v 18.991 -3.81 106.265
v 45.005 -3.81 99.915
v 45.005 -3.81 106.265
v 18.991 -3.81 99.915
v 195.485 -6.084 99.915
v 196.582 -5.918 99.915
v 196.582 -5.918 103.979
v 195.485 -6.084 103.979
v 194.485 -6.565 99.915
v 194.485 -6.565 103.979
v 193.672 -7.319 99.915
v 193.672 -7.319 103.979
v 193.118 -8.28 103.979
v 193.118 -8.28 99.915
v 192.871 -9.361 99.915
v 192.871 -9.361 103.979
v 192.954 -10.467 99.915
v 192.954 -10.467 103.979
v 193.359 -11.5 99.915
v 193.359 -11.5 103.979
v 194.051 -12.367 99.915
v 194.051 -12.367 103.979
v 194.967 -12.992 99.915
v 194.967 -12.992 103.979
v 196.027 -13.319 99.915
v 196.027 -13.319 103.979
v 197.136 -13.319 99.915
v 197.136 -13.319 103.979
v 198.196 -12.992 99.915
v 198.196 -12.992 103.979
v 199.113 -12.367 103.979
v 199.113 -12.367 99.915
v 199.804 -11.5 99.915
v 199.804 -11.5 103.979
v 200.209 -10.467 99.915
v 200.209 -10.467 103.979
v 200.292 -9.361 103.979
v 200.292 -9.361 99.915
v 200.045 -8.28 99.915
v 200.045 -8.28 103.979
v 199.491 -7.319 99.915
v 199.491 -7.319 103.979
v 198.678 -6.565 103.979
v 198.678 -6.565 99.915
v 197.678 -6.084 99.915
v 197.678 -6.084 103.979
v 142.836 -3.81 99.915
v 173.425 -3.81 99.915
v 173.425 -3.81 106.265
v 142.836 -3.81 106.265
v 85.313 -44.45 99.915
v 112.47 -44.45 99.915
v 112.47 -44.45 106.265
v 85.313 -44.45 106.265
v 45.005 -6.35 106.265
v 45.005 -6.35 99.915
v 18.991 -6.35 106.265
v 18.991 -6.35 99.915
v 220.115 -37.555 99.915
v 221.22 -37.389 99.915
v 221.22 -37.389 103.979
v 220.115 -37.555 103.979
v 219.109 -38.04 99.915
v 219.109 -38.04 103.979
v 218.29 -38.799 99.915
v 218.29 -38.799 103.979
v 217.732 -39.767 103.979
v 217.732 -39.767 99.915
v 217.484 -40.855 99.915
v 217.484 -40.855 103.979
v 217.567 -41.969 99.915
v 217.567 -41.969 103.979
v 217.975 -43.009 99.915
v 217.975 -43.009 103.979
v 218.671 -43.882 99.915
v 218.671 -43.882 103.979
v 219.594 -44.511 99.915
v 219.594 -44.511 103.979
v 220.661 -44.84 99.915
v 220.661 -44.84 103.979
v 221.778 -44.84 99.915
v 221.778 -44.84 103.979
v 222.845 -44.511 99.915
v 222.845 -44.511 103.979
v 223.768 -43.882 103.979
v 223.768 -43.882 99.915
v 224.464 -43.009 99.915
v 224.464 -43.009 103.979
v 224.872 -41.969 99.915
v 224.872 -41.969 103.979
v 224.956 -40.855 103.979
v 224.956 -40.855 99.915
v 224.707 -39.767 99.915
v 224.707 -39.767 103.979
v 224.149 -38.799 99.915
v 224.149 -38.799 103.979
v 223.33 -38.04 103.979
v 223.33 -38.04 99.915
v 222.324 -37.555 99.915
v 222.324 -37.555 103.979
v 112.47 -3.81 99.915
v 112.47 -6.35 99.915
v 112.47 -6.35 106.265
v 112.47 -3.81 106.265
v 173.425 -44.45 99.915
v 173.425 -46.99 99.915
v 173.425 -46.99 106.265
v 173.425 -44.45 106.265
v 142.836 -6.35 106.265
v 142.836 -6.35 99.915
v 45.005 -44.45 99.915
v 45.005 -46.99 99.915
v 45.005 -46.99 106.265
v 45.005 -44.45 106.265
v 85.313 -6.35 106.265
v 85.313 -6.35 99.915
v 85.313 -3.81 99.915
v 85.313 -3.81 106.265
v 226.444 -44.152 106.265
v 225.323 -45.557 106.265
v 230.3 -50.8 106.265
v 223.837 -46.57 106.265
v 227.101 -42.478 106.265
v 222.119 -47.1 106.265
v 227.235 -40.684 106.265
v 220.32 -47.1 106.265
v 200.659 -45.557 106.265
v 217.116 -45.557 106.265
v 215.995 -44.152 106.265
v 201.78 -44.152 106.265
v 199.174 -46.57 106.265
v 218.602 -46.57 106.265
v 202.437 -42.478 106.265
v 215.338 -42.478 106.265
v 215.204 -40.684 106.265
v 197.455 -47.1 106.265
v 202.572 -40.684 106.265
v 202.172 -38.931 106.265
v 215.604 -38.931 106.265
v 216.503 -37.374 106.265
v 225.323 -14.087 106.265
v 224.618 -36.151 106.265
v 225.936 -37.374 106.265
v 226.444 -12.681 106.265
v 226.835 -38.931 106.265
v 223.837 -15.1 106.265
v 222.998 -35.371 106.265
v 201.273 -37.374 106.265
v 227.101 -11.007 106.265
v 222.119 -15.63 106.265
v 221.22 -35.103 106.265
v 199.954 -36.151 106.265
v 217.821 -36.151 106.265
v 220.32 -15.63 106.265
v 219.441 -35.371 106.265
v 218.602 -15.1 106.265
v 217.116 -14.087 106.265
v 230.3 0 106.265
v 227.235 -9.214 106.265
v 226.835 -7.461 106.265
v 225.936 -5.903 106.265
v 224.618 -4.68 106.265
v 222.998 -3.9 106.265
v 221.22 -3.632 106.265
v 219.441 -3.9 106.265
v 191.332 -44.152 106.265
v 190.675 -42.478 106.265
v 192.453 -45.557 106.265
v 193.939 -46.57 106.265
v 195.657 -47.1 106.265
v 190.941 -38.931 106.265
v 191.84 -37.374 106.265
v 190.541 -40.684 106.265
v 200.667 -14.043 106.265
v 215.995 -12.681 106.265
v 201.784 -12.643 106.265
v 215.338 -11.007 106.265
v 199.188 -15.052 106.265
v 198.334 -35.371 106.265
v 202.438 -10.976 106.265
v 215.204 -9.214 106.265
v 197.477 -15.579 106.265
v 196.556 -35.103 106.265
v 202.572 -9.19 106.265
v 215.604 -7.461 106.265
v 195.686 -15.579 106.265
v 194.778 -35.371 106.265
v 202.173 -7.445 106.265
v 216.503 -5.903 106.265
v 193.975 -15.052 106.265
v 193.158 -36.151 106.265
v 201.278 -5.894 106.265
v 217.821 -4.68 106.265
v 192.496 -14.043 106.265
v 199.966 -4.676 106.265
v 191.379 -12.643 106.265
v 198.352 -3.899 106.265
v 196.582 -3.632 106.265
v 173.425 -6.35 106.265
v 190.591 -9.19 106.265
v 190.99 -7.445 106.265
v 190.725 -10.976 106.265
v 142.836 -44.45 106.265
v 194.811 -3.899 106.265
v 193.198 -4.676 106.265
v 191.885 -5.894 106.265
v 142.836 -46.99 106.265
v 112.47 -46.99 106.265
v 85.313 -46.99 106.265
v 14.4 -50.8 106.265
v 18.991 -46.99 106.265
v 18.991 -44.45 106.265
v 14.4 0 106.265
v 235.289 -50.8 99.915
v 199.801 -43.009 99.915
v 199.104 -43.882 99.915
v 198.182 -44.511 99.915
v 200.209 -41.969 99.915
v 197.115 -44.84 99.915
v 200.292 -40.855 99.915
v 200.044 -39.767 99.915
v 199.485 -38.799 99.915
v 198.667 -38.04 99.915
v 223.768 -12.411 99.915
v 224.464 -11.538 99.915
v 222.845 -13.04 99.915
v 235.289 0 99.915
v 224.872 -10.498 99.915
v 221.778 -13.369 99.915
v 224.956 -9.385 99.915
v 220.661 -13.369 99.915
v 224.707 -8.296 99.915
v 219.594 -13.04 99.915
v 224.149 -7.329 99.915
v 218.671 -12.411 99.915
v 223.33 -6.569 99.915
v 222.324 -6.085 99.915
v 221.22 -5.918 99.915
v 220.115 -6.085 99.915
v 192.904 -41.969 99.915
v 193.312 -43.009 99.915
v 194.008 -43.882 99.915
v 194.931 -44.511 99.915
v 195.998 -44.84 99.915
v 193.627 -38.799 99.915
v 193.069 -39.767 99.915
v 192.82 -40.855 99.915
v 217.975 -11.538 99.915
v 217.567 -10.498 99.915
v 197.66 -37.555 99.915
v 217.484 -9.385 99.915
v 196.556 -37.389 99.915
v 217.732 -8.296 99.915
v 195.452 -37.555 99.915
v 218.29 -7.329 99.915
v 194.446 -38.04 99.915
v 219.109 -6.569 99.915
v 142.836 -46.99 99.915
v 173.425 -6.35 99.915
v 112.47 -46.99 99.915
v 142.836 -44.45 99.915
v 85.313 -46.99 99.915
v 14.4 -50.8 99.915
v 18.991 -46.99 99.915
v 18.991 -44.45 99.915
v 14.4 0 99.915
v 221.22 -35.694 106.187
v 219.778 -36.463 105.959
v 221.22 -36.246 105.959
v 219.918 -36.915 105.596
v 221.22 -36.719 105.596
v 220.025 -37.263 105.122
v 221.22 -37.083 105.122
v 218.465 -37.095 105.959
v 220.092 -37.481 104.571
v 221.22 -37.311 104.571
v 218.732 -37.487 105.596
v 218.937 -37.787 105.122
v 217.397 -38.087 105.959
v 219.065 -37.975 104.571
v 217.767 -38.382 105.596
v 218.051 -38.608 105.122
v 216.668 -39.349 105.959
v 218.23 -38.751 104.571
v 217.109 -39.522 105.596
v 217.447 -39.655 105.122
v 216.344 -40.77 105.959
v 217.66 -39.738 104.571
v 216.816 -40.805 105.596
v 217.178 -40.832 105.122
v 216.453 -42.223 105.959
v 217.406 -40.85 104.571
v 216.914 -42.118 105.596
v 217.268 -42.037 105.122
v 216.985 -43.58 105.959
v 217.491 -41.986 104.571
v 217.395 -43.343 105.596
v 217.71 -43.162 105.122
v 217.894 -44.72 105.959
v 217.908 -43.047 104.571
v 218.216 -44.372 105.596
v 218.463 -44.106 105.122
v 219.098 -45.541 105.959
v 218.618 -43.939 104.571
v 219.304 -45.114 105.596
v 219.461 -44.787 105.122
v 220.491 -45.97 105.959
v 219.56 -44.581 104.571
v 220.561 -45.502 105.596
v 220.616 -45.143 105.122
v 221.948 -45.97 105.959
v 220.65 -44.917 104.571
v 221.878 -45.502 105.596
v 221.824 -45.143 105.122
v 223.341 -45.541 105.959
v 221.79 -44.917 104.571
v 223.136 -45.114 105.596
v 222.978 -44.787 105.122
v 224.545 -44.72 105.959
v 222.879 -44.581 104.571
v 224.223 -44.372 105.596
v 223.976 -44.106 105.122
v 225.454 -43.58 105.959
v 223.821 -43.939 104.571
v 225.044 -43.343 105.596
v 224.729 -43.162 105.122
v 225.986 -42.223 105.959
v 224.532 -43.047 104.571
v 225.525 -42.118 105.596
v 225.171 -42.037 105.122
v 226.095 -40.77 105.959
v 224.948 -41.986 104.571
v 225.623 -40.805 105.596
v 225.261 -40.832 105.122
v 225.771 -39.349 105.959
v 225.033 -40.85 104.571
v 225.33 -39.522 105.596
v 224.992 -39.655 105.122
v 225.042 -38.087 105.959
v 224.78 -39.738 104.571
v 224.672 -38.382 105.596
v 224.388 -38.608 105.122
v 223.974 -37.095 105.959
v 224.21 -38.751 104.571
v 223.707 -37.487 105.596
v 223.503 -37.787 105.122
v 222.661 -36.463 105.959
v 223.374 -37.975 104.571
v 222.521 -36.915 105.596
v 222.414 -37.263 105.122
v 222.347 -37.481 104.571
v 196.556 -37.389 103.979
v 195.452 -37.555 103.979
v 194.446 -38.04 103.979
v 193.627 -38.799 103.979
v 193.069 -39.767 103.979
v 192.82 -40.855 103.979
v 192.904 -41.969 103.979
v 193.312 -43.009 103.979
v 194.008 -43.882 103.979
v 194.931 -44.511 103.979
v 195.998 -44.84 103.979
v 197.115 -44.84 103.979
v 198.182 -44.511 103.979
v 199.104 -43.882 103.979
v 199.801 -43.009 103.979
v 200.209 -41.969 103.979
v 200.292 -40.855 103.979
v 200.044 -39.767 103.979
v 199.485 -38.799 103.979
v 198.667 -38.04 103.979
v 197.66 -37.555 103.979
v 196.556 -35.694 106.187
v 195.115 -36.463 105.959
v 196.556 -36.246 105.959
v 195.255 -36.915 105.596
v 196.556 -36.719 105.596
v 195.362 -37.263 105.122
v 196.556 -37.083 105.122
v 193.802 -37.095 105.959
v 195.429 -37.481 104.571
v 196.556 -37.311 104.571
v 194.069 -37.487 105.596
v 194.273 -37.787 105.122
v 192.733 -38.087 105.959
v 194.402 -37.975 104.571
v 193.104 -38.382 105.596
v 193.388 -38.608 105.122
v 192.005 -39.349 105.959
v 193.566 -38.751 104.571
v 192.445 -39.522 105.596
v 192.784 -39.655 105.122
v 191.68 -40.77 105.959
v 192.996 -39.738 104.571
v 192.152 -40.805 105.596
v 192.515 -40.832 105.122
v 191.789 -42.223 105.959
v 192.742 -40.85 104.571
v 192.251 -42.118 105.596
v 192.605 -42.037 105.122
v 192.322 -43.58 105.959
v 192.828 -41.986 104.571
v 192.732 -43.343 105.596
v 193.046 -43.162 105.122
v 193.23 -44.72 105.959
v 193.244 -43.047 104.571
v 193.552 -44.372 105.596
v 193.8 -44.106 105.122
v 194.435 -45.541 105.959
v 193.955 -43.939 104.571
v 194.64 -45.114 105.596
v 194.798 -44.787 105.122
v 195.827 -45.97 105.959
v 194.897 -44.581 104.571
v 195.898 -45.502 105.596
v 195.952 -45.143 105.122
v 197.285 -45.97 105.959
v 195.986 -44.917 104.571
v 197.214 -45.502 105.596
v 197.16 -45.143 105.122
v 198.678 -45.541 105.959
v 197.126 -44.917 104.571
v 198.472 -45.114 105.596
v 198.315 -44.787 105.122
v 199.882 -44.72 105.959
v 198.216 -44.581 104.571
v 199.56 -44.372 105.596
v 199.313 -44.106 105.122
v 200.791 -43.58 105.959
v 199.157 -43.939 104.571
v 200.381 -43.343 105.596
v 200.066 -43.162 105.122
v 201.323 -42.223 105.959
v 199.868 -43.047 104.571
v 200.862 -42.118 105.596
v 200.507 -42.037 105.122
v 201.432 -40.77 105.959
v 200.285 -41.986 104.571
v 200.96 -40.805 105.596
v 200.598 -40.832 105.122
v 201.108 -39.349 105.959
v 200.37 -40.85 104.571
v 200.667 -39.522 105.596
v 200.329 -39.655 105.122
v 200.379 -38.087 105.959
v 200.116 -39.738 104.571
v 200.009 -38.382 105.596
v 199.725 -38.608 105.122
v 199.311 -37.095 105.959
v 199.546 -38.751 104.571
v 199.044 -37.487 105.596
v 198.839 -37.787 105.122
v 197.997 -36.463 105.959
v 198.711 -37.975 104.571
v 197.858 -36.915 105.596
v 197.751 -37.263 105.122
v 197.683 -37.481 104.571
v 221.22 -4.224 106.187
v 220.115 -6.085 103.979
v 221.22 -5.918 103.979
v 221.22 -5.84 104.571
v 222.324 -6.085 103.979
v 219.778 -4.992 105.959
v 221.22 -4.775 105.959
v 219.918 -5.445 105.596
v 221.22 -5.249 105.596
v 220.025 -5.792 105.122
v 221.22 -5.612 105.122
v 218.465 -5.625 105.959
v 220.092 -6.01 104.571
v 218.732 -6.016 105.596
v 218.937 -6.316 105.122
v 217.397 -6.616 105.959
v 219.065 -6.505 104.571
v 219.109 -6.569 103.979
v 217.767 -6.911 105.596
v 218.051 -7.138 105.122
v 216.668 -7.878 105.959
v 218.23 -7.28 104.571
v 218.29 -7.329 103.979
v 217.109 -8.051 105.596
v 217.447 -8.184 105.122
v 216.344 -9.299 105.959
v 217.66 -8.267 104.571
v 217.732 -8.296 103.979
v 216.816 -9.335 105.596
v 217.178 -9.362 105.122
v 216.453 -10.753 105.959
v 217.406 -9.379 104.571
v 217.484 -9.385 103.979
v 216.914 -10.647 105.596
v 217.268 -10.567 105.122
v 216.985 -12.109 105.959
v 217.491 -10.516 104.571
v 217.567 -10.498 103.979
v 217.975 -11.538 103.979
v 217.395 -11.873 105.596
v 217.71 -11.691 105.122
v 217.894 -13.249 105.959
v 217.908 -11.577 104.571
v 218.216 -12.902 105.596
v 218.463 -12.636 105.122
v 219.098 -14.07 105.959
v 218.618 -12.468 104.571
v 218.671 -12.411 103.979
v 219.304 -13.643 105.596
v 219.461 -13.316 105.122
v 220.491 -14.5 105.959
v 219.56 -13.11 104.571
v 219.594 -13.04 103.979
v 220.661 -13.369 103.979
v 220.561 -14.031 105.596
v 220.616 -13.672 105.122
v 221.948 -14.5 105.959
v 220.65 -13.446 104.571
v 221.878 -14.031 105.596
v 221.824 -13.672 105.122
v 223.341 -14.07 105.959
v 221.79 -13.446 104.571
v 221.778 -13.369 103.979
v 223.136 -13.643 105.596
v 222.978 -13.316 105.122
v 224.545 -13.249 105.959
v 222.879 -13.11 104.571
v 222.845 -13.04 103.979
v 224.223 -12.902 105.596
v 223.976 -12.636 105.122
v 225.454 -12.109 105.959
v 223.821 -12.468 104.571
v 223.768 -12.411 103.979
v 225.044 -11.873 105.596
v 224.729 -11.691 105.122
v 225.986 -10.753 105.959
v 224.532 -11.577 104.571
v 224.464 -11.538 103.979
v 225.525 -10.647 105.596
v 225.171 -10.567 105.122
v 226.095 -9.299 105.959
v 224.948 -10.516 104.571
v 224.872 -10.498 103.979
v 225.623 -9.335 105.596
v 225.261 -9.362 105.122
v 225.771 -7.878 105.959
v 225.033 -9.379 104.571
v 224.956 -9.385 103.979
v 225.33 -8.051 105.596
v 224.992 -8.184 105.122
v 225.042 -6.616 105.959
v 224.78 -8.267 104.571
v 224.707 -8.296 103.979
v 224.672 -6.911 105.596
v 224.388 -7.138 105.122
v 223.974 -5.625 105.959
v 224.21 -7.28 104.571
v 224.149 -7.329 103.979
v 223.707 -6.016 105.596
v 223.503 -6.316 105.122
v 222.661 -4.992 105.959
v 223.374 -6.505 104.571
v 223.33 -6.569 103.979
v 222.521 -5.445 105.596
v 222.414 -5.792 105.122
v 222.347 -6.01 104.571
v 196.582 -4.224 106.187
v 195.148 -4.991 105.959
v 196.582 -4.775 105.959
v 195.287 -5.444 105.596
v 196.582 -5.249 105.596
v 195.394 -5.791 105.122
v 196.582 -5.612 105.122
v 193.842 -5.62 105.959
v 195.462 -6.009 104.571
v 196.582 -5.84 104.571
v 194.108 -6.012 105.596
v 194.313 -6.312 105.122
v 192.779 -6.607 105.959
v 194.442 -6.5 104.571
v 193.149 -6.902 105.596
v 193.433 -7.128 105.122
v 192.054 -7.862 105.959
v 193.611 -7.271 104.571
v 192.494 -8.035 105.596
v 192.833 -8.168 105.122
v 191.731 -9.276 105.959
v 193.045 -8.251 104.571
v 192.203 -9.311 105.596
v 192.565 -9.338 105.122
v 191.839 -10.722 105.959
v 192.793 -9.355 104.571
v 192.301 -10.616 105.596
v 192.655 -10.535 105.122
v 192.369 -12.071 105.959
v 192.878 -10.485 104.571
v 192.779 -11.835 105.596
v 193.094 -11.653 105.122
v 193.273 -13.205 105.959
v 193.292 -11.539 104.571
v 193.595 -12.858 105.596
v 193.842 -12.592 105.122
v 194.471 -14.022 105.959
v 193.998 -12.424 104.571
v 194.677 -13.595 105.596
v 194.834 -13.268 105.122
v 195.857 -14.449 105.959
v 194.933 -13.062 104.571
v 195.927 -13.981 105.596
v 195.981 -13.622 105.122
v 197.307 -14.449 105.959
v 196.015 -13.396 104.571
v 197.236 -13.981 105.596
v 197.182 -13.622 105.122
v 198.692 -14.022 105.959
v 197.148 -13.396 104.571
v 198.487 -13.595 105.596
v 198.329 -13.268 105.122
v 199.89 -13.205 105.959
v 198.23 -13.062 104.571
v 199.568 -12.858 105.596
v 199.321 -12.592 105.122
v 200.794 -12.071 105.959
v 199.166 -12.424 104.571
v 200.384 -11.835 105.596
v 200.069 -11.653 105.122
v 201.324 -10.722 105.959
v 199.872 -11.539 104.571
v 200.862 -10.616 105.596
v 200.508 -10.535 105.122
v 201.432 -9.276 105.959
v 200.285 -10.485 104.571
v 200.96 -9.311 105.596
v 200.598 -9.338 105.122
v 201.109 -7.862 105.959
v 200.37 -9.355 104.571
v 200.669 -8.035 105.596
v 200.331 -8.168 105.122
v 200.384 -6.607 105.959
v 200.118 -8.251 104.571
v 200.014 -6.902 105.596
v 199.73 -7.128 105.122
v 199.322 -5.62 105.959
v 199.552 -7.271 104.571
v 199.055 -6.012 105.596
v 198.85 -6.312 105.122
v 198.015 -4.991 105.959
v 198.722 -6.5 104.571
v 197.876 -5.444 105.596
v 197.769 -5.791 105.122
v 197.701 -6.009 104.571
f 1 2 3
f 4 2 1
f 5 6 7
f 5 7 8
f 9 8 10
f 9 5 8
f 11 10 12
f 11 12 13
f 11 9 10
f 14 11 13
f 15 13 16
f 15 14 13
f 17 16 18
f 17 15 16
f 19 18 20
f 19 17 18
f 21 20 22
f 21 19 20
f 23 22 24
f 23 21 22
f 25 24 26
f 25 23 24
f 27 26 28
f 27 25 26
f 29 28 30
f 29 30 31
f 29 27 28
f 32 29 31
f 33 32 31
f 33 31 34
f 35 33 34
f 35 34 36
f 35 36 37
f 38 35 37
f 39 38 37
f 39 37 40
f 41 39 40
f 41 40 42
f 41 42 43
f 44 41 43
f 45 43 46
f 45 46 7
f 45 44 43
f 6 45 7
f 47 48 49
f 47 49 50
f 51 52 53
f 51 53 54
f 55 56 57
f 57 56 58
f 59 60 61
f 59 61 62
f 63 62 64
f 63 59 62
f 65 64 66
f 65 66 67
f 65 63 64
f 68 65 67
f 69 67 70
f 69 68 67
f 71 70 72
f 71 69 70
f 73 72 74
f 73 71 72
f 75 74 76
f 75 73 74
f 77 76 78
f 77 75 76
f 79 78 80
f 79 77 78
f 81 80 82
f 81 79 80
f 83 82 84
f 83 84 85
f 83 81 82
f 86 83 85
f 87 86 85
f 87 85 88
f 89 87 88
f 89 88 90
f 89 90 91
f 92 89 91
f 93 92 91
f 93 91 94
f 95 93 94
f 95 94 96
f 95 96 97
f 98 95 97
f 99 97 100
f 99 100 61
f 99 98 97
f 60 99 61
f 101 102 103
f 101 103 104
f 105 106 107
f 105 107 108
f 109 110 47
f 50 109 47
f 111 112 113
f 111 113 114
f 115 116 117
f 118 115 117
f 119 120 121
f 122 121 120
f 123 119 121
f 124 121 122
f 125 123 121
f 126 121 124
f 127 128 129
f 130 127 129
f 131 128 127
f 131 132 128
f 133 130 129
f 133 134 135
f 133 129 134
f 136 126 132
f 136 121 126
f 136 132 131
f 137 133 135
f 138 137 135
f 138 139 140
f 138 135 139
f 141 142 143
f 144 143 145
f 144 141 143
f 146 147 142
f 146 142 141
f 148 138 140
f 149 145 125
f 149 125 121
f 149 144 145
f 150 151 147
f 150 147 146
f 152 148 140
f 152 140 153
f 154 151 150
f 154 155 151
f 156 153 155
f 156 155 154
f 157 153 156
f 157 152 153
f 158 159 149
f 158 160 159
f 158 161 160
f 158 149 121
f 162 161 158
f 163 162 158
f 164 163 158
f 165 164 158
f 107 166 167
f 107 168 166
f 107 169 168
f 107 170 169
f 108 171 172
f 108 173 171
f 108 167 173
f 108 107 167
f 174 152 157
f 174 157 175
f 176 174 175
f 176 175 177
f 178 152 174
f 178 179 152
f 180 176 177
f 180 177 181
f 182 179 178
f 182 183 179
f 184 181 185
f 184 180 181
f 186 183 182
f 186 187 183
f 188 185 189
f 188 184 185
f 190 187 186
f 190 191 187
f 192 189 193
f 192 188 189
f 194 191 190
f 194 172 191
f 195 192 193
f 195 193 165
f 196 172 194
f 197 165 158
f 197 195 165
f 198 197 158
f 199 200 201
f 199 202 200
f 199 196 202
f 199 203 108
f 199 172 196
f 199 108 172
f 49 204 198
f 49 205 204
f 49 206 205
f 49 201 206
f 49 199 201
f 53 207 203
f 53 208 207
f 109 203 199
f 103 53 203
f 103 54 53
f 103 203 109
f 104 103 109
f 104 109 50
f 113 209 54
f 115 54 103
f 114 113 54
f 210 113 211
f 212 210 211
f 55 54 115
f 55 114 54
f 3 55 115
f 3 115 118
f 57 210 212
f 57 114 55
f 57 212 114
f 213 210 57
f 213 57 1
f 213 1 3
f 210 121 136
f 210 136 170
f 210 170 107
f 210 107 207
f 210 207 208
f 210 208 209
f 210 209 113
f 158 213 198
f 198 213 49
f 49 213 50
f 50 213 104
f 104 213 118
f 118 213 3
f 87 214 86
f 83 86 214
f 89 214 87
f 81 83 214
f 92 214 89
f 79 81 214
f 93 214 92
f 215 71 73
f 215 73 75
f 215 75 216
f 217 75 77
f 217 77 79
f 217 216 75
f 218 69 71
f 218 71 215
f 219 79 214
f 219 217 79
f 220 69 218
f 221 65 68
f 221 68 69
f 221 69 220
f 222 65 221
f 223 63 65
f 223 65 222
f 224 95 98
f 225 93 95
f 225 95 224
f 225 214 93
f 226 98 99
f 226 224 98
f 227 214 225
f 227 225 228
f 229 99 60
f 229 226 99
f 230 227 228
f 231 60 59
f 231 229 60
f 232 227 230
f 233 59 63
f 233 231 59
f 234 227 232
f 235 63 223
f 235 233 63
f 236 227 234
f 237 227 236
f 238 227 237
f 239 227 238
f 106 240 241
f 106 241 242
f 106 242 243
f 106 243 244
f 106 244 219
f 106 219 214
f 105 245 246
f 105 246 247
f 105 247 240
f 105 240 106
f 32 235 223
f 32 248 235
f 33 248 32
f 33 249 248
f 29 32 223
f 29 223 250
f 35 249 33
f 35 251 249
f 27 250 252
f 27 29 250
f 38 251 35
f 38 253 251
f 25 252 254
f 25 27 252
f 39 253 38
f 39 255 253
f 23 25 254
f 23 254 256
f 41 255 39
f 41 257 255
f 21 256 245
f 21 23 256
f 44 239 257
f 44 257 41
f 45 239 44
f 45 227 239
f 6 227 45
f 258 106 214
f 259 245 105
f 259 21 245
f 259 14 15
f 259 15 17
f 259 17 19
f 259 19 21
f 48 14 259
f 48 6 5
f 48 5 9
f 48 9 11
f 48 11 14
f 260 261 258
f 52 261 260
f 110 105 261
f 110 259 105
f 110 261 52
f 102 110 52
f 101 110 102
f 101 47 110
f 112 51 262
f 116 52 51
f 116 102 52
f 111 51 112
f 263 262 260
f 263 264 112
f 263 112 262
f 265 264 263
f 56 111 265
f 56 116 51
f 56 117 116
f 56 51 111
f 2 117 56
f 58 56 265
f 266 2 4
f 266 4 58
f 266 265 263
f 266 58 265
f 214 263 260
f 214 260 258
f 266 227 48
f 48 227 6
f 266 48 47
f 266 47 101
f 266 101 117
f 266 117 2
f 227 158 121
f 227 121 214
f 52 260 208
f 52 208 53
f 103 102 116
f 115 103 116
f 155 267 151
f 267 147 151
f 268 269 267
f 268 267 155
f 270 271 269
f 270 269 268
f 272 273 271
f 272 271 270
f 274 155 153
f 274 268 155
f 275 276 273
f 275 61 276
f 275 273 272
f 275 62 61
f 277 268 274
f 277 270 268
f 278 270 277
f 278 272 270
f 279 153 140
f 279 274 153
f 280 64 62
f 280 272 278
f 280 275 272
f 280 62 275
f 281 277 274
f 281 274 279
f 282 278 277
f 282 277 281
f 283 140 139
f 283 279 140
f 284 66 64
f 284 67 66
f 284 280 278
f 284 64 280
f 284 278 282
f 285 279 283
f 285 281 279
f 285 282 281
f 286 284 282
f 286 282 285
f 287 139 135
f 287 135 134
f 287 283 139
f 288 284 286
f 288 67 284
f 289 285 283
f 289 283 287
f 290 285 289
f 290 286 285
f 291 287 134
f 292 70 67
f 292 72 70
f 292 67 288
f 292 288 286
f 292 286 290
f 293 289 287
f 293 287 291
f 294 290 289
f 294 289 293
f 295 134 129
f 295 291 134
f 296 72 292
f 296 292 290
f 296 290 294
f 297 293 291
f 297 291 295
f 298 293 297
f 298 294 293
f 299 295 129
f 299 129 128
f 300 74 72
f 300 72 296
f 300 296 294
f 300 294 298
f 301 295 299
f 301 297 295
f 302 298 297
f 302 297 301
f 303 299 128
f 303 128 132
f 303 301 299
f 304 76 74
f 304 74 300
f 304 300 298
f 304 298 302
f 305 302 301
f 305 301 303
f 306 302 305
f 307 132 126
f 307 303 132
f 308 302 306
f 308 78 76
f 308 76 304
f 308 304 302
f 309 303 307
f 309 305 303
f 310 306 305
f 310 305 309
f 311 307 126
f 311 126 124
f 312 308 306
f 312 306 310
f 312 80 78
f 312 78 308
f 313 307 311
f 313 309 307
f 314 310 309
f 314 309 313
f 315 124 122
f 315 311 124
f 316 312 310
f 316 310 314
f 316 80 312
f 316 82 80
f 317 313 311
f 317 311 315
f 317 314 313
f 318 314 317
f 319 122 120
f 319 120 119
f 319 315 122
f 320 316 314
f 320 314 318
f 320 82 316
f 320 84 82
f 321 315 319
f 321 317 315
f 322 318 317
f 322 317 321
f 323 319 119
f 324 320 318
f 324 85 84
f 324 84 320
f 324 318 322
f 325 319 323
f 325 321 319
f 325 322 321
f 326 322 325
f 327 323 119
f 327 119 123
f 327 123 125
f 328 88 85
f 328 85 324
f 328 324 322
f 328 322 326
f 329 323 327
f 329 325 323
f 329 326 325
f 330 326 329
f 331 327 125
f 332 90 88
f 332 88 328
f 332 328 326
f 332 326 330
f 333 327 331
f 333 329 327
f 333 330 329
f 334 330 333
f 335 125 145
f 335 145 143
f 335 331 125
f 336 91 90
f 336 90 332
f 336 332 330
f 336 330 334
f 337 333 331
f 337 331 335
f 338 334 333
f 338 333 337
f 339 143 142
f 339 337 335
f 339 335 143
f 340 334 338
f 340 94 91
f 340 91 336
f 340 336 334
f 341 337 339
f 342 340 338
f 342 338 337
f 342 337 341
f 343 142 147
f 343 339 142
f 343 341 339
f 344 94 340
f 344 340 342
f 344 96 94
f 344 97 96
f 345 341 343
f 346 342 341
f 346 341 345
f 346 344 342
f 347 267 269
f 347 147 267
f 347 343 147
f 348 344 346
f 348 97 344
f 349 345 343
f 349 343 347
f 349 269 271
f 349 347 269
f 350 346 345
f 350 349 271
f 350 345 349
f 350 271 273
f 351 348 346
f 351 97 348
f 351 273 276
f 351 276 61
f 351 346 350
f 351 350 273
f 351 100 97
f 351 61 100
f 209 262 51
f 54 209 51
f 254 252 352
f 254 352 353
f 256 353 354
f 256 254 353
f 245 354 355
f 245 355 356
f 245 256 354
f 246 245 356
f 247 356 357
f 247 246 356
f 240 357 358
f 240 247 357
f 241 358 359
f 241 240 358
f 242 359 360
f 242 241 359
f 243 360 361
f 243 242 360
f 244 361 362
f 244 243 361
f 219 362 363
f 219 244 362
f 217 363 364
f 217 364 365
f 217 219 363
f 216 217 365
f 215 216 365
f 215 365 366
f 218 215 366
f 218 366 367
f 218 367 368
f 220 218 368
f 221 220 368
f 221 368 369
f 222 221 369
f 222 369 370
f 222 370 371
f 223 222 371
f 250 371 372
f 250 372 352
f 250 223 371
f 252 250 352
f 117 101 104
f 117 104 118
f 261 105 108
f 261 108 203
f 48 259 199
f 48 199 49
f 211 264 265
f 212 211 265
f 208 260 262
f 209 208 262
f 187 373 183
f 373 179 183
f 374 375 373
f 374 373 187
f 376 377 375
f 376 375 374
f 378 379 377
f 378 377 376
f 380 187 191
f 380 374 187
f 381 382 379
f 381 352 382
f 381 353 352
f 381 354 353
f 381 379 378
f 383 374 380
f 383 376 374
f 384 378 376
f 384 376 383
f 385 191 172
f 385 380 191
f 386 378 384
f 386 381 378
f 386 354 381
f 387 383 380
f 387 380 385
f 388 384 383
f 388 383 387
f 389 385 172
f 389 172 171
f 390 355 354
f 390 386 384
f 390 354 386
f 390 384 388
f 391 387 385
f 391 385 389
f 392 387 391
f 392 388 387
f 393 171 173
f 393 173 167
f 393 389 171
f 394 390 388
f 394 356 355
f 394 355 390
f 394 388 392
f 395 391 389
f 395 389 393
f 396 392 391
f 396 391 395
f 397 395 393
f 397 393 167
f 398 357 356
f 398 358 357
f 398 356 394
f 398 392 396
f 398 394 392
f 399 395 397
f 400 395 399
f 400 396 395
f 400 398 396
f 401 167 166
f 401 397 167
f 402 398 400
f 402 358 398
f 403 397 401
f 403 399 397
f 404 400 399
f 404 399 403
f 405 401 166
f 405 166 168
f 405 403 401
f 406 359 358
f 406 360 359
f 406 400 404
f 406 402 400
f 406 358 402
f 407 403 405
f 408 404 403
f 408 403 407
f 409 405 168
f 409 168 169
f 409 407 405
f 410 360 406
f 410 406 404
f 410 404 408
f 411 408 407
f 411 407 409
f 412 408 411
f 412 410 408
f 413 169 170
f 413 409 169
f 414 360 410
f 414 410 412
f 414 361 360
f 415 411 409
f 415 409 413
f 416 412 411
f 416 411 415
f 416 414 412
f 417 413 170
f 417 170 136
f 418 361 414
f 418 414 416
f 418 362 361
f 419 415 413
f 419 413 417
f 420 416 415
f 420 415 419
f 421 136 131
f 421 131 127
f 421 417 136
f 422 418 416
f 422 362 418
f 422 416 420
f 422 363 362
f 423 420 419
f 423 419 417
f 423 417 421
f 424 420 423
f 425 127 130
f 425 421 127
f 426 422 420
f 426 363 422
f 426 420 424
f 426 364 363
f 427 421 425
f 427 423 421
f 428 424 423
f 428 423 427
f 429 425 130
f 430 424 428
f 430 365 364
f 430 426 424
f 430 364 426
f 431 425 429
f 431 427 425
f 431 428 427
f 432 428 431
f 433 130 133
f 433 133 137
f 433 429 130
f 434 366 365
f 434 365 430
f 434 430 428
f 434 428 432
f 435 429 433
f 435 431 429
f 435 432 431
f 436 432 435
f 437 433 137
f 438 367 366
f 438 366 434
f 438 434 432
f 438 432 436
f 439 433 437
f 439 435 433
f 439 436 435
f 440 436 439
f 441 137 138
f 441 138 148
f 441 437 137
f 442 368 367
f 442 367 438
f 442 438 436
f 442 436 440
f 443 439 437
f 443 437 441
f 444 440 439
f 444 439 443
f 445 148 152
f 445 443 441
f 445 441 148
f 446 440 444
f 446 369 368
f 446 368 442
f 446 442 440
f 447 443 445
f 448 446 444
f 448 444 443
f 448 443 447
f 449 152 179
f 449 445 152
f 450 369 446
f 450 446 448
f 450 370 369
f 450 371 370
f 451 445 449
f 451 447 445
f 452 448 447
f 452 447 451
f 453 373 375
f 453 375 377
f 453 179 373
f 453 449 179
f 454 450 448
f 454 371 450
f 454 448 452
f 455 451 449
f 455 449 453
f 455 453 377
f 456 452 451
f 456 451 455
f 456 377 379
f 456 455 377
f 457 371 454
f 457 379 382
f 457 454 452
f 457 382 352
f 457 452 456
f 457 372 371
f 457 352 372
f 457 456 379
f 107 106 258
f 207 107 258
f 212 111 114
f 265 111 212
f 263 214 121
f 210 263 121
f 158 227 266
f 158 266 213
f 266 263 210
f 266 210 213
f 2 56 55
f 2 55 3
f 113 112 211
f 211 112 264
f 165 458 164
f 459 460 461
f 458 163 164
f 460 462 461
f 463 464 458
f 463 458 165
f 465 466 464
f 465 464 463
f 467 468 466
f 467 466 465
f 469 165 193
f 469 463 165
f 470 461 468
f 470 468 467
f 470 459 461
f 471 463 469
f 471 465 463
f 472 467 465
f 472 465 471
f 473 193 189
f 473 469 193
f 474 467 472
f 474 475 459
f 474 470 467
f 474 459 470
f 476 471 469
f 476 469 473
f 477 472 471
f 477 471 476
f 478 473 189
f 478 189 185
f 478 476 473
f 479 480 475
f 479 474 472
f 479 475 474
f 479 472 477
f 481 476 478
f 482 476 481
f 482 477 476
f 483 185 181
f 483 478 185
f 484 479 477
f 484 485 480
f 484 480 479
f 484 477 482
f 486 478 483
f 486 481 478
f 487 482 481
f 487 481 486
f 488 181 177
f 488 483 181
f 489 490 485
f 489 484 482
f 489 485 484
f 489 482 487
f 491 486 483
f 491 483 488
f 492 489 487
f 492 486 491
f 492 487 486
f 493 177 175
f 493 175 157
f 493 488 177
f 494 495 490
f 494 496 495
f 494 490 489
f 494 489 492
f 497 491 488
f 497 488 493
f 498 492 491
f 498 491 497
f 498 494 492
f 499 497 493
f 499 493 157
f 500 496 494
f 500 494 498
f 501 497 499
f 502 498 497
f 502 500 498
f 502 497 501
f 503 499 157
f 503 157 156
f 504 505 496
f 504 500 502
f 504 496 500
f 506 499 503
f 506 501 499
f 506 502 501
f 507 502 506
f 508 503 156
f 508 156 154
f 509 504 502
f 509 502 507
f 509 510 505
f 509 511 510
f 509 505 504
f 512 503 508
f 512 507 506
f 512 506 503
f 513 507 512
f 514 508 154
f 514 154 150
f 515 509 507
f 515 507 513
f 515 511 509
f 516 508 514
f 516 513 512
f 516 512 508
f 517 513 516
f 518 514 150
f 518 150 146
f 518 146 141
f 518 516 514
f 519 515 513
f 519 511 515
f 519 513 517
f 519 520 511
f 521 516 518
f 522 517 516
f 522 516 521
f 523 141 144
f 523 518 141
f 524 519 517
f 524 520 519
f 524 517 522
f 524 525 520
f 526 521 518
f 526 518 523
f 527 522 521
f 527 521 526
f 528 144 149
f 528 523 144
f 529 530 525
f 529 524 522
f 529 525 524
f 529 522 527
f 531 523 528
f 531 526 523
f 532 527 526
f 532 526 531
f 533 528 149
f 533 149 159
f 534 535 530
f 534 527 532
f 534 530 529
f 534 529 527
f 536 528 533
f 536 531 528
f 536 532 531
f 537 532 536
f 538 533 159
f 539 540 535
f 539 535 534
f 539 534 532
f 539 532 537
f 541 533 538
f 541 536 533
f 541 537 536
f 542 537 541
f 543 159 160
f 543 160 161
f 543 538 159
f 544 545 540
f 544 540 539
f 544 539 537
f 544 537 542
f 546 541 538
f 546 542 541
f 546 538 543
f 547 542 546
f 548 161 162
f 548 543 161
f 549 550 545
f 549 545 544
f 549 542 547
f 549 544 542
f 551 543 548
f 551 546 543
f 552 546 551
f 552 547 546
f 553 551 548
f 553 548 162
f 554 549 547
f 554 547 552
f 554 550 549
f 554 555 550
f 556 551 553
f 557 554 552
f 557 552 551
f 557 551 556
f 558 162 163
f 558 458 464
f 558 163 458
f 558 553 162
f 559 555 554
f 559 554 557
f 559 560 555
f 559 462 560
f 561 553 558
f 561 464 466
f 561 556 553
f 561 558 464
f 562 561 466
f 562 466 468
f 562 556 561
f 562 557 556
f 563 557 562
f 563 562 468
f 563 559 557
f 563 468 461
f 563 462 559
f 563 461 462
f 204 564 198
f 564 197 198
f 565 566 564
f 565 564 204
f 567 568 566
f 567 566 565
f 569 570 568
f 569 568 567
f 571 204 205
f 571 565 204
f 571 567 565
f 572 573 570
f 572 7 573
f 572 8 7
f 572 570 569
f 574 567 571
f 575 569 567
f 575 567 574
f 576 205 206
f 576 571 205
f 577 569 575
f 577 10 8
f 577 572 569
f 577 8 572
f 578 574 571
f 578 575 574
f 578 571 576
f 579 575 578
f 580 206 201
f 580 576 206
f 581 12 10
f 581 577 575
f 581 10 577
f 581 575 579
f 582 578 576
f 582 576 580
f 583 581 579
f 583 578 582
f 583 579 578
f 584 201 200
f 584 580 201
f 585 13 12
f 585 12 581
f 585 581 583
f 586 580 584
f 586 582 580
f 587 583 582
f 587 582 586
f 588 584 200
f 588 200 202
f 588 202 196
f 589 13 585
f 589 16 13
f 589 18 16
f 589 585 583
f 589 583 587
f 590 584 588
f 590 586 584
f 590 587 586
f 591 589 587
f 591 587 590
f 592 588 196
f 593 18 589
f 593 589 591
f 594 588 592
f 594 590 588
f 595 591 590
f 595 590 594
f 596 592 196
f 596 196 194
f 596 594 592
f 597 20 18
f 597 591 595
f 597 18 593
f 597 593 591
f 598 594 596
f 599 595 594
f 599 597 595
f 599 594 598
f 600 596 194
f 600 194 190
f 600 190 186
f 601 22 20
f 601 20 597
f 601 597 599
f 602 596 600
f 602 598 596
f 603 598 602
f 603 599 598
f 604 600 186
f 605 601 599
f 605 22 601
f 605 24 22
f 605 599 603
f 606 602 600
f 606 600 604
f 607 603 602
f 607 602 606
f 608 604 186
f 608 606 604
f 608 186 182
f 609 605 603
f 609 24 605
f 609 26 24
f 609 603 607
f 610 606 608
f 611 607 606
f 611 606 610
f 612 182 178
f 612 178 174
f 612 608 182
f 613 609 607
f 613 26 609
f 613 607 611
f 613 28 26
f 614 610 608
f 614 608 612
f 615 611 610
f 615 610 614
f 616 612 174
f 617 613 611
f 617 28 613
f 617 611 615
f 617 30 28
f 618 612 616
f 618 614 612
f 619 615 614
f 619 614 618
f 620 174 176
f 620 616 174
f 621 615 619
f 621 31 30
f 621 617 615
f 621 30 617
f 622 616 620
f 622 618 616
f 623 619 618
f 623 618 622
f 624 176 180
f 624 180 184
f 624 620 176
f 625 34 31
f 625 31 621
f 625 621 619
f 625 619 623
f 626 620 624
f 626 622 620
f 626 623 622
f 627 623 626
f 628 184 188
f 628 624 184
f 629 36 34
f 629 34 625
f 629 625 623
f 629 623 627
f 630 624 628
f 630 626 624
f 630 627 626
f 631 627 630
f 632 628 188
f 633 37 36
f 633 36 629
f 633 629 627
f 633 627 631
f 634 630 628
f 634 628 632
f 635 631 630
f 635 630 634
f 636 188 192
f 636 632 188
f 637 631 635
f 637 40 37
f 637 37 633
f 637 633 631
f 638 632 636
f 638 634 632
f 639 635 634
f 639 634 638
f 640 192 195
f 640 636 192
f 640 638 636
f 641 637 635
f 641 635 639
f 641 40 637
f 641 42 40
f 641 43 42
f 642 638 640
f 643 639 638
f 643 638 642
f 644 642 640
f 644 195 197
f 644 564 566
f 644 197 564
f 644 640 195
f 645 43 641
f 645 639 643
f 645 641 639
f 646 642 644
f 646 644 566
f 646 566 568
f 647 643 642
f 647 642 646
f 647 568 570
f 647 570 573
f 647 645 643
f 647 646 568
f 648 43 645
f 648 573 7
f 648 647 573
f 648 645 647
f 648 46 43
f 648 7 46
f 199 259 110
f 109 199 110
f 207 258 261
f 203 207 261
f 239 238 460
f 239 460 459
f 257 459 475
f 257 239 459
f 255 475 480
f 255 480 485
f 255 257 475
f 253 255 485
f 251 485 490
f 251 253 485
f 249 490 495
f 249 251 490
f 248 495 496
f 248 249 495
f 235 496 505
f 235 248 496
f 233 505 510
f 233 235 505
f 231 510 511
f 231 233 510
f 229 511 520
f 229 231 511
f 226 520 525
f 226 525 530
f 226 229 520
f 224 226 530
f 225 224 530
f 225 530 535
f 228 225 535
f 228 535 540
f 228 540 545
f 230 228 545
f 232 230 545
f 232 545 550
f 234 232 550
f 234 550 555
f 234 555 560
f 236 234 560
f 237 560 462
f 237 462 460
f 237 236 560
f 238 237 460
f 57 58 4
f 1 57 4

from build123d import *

# Parameters (mm, degrees)
F0_W     = 50.8
F0_H     = 215.9
F0_R     = 3.7465
F0_W_2   = 2.54
F0_H_2   = 30.5881015956
F0_R_2   = 3.7211
F0_H_3   = 27.157658129
F0_H_4   = 26.0141715407
F1_DEPTH = 6.35
F2_ANGLE = 180
F4_DEPTH = 50.8
F5_ANGLE = 90
F6_ANGLE = -90
F7_R     = 2.286


with BuildPart() as f1:
    # F0 (on Front) → F1 (new body)
    with BuildSketch(Plane.XZ):
        with Locations((-10.9999279406, -8.0348854876)):
            Rectangle(F0_W, F0_H)
        with Locations((-26.7352279406, -106.9043854876)):
            Circle(F0_R, mode=Mode.SUBTRACT)
        with Locations((-26.7352279406, -82.2409854876)):
            Circle(F0_R, mode=Mode.SUBTRACT)
        with Locations((-31.3199279406, -43.8153201211)):
            Rectangle(F0_W_2, F0_H_2, mode=Mode.SUBTRACT)
        with Locations((4.7353720594, -106.9043854876)):
            Circle(F0_R, mode=Mode.SUBTRACT)
        with Locations((4.7607720594, -82.2663985804)):
            Circle(F0_R_2, mode=Mode.SUBTRACT)
        with Locations((9.3200720594, -43.8153201211)):
            Rectangle(F0_W_2, F0_H_2, mode=Mode.SUBTRACT)
        with Locations((-31.3199279406, 15.4236085401)):
            Rectangle(F0_W_2, F0_H_3, mode=Mode.SUBTRACT)
        with Locations((-31.3199279406, 82.3172128331)):
            Rectangle(F0_W_2, F0_H_4, mode=Mode.SUBTRACT)
        with Locations((9.3200720594, 15.4236085401)):
            Rectangle(F0_W_2, F0_H_3, mode=Mode.SUBTRACT)
        with Locations((9.3200720594, 82.3172128331)):
            Rectangle(F0_W_2, F0_H_4, mode=Mode.SUBTRACT)
    extrude(amount=F1_DEPTH)


with BuildPart() as f1_1:
    # F2: moved
    add(f1.part.rotate(Axis((-10.9999279406, 0, 99.9151145124), (1, 0, 0)), F2_ANGLE))

    # F3 (on face) → F4 (join)
    with BuildSketch(Plane.YZ.offset(14.4000720594)):
        Polygon((0, 320.8044469357), (0, 315.8151145124), (6.35, 315.8151145124), align=None)
    extrude(amount=-F4_DEPTH)


with BuildPart() as f1_2:
    # F5: moved
    add(f1_1.part.rotate(Axis((-10.9999279406, 0, 99.9151145124), (1, 0, 0)), F5_ANGLE))


with BuildPart() as f1_3:
    # F6: moved
    add(f1_2.part.rotate(Axis((14.4000720594, 0, 103.0901145124), (0, 0, -1)), F6_ANGLE))

    # F7
    f7_edges = [f1_3.edges().sort_by_distance(p)[0] for p in [
        (196.581585, -13.3604, 106.265115),
        (221.219572, -13.4112, 106.265115),
        (196.556172, -44.8818, 106.265115),
        (221.219572, -44.8818, 106.265115),
    ]]
    fillet(f7_edges, radius=F7_R)


solid = f1_3.part
